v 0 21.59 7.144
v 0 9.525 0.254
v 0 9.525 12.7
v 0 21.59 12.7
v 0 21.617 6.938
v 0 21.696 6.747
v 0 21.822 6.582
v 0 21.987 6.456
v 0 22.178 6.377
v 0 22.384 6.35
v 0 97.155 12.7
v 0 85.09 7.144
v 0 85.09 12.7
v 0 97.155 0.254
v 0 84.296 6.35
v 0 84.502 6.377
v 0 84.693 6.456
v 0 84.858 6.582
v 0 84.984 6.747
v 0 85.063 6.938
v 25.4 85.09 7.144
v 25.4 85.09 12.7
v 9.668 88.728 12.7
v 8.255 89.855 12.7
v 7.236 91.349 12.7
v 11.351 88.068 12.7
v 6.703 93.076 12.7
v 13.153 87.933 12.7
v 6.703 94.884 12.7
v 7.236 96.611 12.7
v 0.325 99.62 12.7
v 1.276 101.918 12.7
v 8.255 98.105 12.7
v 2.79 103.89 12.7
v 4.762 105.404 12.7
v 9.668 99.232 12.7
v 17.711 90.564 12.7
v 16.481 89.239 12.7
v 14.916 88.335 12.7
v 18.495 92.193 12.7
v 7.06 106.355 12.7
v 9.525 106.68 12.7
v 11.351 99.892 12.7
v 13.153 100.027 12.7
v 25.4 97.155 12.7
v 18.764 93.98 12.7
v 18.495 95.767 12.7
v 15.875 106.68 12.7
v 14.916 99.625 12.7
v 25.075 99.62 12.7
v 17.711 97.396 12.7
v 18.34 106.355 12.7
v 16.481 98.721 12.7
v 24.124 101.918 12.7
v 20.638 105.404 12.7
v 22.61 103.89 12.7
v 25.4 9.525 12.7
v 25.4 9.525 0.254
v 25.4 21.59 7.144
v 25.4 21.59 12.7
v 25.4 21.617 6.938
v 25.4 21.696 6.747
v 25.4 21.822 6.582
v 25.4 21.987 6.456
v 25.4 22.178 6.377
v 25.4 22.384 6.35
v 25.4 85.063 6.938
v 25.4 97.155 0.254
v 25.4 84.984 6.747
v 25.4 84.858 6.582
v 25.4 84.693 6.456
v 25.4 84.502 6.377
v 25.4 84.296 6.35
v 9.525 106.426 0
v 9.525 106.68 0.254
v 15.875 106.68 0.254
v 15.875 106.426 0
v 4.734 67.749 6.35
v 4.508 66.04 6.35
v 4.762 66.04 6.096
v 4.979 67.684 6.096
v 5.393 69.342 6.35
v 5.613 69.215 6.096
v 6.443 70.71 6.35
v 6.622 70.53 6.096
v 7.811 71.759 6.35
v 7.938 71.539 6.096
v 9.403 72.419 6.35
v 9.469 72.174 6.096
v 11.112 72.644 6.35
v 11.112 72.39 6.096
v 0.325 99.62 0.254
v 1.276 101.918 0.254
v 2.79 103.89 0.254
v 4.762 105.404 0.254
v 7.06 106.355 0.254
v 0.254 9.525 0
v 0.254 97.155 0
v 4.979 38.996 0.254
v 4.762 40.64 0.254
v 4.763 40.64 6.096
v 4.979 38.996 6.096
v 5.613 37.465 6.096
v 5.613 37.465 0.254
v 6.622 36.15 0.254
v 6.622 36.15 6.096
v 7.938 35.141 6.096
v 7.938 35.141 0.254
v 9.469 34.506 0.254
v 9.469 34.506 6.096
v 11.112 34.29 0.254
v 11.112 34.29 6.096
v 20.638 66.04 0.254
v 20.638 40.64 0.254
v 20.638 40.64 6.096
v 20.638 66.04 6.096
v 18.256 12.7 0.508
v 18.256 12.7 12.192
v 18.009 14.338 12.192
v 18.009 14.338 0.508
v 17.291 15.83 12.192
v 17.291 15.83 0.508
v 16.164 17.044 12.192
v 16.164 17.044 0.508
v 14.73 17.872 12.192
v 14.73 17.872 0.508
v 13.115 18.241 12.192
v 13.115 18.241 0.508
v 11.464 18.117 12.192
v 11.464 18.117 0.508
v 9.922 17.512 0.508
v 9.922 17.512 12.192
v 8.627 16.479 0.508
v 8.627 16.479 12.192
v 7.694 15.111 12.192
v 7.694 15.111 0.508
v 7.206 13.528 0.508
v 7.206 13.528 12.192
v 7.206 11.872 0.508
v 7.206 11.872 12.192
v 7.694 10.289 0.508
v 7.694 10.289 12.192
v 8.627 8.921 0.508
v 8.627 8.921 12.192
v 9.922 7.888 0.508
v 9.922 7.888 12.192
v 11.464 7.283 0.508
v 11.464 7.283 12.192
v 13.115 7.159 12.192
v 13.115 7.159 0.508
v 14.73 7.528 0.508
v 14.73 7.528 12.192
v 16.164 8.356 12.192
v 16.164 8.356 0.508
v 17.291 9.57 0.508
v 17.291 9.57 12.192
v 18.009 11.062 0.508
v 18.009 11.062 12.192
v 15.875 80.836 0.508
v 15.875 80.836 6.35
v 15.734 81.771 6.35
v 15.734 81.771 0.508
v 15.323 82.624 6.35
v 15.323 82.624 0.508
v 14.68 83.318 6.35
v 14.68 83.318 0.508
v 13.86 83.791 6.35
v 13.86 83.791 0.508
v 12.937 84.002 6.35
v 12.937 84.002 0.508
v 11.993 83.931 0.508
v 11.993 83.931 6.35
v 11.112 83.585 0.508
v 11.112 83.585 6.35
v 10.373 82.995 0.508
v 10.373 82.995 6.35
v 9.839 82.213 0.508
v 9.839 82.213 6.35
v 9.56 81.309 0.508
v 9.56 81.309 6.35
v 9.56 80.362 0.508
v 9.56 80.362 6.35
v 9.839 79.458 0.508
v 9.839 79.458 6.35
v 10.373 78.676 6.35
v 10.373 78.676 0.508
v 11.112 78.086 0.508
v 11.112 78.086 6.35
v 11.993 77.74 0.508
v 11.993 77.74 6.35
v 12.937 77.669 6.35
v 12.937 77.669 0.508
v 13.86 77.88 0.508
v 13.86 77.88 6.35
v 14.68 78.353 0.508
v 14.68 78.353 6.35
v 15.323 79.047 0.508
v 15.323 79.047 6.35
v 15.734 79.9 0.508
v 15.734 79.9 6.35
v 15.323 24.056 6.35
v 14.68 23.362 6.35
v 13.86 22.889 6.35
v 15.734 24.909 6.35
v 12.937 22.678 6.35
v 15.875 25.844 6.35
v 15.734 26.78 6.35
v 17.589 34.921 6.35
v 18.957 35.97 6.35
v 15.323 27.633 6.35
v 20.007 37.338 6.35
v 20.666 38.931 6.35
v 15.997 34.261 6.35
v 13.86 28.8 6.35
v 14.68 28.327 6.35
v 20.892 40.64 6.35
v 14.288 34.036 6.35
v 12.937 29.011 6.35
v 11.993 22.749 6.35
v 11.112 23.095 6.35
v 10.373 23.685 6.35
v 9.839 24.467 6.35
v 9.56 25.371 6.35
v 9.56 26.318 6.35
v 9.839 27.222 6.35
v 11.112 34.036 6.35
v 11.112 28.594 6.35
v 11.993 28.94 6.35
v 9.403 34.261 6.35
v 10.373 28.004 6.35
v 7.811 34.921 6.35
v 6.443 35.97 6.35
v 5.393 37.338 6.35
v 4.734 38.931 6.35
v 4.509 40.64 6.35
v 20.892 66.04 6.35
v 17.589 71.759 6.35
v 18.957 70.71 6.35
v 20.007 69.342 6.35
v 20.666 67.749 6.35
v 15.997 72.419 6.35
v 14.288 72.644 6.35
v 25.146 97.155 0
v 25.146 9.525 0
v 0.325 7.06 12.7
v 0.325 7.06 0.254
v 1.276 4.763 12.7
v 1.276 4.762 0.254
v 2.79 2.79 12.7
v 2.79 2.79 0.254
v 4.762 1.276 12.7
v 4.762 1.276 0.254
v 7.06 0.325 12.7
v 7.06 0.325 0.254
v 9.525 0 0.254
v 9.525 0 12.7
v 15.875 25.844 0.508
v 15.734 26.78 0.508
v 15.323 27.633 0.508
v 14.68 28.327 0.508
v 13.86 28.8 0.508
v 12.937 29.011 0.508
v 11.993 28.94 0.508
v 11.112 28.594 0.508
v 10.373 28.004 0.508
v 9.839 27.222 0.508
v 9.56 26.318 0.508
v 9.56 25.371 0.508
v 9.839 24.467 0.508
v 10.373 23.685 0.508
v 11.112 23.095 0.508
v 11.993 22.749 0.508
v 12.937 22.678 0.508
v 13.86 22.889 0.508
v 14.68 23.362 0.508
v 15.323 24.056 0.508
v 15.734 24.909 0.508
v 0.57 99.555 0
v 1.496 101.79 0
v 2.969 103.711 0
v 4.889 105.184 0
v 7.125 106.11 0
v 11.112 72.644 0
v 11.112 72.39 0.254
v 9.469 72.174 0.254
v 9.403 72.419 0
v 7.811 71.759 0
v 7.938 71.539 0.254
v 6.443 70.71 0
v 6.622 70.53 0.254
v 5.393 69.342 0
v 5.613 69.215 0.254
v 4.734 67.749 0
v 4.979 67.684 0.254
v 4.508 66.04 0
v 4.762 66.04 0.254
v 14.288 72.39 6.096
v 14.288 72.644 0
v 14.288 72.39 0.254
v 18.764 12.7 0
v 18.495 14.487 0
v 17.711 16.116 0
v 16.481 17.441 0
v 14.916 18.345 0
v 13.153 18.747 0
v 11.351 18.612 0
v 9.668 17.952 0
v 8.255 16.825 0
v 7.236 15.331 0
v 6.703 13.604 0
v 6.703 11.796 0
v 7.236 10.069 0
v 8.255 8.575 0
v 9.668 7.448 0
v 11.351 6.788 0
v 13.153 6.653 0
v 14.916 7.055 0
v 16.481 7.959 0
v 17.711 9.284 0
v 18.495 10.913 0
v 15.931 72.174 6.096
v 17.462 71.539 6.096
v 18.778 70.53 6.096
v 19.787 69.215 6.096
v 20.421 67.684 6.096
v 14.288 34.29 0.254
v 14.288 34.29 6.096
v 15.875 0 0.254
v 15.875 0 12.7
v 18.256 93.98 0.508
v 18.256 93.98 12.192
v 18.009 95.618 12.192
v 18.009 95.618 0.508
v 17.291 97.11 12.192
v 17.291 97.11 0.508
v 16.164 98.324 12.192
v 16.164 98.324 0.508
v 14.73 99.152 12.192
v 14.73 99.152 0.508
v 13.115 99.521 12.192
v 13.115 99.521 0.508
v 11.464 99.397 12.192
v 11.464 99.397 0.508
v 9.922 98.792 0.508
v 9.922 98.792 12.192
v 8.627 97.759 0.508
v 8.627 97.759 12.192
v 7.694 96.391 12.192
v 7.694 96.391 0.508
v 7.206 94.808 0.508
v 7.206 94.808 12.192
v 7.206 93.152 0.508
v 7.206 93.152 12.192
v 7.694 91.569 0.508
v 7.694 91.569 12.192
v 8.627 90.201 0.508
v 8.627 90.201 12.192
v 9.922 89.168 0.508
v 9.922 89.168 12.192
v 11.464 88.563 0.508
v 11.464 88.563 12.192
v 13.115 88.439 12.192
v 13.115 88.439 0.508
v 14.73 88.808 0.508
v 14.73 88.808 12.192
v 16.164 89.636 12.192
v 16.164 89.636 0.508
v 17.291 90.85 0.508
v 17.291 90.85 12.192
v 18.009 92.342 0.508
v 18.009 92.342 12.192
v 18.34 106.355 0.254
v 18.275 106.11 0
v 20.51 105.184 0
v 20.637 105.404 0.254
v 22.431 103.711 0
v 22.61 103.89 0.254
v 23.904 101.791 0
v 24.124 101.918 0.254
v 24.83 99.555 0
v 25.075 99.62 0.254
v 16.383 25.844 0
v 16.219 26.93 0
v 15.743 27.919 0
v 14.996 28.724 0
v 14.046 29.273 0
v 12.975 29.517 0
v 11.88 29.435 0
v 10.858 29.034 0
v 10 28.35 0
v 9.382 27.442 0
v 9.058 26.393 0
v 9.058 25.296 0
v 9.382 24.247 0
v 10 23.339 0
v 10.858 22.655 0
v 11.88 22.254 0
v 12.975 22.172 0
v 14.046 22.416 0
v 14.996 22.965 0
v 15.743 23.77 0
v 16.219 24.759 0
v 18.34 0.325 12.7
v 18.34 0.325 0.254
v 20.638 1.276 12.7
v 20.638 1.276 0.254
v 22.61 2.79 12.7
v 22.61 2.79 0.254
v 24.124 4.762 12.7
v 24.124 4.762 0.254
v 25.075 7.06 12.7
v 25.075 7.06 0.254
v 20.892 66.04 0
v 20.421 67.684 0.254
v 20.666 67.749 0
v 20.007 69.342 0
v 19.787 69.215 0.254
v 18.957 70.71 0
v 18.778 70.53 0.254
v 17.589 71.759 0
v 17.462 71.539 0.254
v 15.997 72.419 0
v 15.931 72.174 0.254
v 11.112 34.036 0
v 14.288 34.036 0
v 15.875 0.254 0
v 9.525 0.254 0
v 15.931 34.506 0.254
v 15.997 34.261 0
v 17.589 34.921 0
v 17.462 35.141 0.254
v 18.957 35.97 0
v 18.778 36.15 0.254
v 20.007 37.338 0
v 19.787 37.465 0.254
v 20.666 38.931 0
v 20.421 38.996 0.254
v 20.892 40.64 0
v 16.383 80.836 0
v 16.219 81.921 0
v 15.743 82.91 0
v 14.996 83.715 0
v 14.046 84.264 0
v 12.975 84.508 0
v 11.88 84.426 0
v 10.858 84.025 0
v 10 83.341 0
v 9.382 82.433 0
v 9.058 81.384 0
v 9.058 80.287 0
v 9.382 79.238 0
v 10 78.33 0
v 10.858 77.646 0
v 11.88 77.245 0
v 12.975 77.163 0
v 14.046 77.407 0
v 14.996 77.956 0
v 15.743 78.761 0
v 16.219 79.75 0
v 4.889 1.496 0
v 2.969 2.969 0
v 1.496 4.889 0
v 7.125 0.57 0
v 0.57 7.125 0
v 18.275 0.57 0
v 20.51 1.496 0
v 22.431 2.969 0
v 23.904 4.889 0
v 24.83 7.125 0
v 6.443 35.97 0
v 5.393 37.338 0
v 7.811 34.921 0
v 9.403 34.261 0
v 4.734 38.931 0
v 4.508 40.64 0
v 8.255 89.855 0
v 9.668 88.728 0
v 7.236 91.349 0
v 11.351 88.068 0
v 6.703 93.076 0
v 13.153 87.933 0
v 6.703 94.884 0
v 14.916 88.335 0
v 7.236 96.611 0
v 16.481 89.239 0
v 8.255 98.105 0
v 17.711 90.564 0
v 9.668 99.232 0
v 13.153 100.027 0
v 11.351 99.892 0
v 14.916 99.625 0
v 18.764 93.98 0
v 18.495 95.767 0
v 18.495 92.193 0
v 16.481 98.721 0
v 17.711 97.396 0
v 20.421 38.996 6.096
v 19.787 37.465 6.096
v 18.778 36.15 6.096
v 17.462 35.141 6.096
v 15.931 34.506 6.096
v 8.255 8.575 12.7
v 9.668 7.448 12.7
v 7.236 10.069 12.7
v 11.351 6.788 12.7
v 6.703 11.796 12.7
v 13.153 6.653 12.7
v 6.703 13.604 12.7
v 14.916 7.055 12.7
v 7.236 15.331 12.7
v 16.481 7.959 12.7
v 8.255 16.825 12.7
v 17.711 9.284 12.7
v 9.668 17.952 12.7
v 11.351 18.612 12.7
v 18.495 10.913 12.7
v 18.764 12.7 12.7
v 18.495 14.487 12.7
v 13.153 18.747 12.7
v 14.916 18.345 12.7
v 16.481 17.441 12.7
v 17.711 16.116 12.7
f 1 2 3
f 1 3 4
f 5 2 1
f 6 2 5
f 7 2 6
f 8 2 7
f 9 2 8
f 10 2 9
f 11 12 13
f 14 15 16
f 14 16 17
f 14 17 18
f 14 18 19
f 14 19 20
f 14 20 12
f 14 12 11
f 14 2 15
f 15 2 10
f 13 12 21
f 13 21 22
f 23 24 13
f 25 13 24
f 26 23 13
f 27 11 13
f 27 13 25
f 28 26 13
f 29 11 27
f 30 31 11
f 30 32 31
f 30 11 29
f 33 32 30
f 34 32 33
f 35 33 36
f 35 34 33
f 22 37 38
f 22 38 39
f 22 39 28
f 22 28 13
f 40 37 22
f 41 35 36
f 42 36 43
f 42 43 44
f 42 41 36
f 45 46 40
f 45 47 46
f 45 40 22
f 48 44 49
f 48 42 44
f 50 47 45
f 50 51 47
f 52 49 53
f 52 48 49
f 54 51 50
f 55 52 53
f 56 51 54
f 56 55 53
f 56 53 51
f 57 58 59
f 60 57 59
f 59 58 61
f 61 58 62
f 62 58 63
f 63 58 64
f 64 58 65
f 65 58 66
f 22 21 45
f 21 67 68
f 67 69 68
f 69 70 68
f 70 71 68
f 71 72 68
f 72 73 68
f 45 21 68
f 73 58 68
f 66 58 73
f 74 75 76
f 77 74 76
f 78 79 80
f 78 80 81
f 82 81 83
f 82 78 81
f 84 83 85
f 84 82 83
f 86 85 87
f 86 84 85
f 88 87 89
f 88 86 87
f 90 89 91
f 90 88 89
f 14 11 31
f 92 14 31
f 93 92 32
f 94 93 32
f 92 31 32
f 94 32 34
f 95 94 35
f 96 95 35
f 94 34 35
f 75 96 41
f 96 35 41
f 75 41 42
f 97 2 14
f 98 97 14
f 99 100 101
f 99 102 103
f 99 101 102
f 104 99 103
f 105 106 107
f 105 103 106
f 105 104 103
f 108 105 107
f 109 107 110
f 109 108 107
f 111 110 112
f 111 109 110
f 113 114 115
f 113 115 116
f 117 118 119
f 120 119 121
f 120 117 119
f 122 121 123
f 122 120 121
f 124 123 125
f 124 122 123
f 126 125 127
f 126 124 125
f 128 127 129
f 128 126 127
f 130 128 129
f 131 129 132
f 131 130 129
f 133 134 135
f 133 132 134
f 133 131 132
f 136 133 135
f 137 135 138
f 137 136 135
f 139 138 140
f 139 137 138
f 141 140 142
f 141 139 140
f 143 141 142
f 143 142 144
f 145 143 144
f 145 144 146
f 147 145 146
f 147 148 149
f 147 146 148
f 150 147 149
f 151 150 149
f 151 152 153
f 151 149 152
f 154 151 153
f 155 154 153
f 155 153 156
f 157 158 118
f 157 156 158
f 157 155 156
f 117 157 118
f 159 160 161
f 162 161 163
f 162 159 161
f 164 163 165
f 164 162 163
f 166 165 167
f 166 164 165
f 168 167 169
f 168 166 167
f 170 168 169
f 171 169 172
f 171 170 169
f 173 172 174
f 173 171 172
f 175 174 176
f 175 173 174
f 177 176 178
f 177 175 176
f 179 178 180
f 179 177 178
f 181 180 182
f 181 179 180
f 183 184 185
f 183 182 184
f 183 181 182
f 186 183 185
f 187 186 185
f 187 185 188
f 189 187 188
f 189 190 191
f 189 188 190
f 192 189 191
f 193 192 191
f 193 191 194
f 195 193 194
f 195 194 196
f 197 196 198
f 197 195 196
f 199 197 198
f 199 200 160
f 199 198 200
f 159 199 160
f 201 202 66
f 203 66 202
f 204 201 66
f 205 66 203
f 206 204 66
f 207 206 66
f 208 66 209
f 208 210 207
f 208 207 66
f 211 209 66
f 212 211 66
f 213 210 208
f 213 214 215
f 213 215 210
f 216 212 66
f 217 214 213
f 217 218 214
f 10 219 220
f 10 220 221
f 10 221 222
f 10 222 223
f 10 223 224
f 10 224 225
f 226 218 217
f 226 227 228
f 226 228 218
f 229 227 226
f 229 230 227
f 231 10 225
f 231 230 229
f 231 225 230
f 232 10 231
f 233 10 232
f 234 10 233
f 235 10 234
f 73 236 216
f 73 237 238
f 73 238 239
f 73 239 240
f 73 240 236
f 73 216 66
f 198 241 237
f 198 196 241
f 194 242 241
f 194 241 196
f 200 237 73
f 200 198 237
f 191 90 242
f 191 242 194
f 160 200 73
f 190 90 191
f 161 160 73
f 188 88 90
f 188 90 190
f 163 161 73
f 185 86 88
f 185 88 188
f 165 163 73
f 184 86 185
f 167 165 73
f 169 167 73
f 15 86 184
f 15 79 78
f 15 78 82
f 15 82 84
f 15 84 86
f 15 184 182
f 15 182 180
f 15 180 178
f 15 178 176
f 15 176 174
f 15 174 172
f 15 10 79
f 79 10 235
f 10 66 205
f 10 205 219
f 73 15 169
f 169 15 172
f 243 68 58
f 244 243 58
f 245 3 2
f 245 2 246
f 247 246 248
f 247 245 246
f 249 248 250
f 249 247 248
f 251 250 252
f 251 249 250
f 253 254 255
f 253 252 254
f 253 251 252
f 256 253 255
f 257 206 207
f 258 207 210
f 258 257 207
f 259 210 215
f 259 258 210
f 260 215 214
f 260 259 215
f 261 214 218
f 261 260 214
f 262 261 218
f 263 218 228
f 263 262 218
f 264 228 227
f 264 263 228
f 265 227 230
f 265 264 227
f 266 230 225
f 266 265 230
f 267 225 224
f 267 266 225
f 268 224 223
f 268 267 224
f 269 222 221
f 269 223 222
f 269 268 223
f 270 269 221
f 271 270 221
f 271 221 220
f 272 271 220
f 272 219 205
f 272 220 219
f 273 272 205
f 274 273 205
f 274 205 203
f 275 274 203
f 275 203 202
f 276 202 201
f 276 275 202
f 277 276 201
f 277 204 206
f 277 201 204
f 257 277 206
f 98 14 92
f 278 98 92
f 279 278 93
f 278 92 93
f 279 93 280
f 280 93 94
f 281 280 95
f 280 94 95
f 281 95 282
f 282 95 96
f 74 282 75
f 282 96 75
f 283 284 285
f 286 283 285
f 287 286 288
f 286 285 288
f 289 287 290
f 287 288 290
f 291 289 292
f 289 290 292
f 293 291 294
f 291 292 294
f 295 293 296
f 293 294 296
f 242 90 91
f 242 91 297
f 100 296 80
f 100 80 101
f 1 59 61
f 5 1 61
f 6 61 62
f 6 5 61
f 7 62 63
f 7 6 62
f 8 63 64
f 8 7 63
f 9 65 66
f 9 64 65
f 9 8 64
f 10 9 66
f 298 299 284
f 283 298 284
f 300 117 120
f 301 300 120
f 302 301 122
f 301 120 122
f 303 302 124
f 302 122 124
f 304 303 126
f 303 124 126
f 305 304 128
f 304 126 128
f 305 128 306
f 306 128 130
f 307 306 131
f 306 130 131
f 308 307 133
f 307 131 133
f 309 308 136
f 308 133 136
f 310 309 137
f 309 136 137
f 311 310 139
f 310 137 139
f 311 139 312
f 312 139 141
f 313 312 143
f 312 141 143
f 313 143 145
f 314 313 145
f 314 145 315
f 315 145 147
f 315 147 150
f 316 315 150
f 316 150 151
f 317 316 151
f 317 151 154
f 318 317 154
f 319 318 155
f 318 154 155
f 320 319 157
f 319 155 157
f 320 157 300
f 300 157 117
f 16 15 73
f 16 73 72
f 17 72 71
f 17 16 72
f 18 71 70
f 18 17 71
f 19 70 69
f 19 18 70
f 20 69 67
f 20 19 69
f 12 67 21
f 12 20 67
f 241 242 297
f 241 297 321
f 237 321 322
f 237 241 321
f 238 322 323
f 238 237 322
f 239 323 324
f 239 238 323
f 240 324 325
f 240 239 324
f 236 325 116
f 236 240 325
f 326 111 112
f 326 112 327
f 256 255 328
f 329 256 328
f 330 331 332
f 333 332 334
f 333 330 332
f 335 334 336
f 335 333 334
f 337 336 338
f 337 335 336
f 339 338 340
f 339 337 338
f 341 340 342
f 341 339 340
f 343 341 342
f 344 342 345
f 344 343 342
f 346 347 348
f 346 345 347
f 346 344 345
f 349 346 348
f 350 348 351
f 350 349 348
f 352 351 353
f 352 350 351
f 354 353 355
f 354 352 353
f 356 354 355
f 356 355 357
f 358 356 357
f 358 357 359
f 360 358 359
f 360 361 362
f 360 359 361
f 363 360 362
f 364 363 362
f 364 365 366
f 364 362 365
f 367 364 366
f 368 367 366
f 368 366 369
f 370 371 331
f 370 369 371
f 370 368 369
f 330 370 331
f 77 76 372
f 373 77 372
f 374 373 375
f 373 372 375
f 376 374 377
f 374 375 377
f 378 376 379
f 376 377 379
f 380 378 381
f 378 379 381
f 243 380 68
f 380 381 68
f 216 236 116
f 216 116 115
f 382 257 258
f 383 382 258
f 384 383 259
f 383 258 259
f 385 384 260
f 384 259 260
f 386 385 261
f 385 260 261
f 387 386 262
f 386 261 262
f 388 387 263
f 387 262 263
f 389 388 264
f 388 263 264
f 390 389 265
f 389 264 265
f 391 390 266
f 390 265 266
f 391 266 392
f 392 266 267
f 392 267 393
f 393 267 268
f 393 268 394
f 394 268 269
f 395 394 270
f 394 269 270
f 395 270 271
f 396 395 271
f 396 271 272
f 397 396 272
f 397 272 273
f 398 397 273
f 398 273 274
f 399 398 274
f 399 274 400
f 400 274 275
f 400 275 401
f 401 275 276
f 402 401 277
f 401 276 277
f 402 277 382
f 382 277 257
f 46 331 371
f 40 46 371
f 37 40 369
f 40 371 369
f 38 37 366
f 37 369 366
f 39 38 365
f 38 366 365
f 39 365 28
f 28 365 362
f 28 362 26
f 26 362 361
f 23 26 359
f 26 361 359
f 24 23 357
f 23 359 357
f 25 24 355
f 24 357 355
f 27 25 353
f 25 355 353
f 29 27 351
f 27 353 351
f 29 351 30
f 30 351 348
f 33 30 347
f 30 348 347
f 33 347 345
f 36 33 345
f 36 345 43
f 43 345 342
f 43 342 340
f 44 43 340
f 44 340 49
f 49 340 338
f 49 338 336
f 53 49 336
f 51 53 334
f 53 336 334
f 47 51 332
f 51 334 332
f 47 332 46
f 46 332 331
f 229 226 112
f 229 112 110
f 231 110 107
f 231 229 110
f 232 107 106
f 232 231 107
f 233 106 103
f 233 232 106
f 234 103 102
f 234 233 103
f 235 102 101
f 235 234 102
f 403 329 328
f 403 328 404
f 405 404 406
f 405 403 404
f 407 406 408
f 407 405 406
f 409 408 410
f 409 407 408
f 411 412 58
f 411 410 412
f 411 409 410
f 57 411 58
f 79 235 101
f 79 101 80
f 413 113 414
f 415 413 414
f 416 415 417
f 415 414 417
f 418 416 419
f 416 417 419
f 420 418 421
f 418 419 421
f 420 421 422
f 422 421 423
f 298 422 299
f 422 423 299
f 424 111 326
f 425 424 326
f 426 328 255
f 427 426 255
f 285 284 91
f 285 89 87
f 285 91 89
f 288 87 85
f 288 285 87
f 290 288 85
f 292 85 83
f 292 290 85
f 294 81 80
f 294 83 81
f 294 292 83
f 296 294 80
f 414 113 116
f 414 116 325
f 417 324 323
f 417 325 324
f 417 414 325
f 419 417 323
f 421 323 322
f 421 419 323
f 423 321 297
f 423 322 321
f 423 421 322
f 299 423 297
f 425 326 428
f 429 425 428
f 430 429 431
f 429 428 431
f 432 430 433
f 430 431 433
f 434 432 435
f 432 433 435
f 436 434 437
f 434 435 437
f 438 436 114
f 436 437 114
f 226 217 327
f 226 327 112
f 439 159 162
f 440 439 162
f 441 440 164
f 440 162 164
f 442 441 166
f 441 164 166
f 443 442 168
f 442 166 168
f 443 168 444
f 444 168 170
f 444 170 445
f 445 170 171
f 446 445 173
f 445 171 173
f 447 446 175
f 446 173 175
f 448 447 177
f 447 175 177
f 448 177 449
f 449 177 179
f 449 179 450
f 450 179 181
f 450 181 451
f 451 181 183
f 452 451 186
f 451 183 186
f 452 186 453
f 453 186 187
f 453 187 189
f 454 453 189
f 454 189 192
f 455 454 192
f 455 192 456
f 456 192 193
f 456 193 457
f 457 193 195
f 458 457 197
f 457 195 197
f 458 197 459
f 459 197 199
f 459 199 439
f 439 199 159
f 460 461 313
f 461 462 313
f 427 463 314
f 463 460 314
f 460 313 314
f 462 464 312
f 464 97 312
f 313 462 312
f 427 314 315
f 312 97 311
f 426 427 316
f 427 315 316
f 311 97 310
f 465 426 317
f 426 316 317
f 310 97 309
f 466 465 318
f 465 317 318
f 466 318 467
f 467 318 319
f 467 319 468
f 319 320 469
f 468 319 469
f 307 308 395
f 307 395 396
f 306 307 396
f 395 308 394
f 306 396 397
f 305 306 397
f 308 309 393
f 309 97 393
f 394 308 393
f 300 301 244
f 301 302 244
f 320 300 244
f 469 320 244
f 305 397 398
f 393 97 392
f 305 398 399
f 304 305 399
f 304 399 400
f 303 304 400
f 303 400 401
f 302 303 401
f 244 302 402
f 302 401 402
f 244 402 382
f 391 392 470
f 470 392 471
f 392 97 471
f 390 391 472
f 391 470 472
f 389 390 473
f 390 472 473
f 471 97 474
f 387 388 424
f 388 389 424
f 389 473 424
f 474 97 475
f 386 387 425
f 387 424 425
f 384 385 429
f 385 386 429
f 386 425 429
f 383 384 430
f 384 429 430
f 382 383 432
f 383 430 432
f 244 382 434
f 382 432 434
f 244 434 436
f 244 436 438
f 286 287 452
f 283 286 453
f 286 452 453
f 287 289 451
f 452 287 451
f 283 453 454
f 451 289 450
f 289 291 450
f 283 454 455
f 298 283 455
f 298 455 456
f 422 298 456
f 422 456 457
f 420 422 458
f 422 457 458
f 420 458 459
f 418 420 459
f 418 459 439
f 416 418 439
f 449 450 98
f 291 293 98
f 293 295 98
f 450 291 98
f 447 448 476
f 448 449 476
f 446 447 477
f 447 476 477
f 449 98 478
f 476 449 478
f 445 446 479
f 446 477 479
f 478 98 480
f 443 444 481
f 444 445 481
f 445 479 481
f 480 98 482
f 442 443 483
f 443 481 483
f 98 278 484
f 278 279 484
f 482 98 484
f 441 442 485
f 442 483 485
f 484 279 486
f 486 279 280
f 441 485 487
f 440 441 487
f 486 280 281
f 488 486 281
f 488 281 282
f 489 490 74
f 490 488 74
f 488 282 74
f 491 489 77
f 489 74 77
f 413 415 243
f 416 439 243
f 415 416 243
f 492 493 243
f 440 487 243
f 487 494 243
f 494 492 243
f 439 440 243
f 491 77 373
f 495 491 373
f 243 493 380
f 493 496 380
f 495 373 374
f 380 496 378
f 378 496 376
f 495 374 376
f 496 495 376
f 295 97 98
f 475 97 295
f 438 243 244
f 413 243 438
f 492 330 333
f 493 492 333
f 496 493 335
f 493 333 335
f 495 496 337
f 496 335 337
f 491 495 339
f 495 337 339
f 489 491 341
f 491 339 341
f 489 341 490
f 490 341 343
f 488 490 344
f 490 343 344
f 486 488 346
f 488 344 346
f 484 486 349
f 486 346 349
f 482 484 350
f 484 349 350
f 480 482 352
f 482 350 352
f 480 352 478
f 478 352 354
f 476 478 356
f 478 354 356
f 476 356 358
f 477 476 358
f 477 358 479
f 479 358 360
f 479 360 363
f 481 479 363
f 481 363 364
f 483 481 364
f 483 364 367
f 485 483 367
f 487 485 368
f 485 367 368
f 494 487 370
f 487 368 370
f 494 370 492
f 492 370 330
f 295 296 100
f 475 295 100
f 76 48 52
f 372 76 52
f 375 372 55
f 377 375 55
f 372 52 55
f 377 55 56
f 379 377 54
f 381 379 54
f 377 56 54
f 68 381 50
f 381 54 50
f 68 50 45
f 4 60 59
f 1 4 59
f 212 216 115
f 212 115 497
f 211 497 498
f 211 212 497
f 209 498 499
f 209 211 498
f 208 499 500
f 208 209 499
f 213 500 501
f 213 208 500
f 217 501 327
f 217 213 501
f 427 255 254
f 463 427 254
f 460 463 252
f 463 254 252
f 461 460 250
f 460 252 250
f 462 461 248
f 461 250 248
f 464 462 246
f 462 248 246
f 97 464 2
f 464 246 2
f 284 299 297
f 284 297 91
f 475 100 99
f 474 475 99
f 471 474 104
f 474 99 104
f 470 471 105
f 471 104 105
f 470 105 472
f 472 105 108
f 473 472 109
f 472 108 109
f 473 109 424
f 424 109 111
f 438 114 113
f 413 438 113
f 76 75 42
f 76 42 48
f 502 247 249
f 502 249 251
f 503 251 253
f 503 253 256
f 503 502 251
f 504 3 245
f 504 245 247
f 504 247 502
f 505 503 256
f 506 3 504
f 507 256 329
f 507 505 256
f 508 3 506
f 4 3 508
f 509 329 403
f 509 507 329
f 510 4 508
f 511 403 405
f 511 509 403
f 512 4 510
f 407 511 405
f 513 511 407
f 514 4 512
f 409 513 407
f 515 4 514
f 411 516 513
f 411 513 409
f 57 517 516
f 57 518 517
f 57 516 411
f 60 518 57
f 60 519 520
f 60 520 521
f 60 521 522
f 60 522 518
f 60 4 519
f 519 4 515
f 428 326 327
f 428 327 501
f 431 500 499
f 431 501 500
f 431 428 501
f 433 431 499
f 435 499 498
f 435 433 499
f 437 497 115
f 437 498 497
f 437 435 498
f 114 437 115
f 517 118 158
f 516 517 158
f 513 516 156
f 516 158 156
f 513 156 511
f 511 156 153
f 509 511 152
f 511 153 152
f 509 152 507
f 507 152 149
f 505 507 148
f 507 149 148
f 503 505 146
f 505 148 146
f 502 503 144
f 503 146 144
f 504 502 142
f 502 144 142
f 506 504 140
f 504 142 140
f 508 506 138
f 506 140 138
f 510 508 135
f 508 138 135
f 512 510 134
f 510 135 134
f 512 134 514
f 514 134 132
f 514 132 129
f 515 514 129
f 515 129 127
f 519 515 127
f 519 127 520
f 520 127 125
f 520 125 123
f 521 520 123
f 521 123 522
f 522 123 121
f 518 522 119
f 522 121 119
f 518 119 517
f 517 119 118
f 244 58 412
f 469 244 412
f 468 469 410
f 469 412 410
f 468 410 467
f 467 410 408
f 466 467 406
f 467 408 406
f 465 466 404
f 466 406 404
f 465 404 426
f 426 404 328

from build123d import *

# Parameters (mm, degrees)
F0_W     = 25.4
F0_H     = 106.68
F1_DEPTH = 12.7
F3_DEPTH = 27.94
F4_R     = 3.175
F5_DEPTH = 25.4
F6_R     = 5.55625
F7_DEPTH = 25.4
F9_DEPTH = 25.4
F10_SIZE = 0.508
F11_SIZE = 0.254
F12_R    = 9.525
F13_SIZE = 0.254


with BuildPart() as f1:
    # F0 (on Top) → F1 (new body)
    with BuildSketch(Plane.XY):
        with Locations((12.7, 53.34)):
            Rectangle(F0_W, F0_H)
    extrude(amount=F1_DEPTH)

    # F2 (on Right) → F3 (cut)
    with BuildSketch(Plane.YZ):
        with BuildLine():
            ThreePointArc((21.59, 7.14375), (21.8224839924, 6.5824839924), (22.38375, 6.35))
            Line((22.38375, 6.35), (84.29625, 6.35))
            ThreePointArc((84.29625, 6.35), (84.8575160076, 6.5824839924), (85.09, 7.14375))
            Line((85.09, 7.14375), (85.09, 19.05))
            Line((85.09, 19.05), (21.59, 19.05))
            Line((21.59, 19.05), (21.59, 7.14375))
        make_face()
    extrude(amount=F3_DEPTH, mode=Mode.SUBTRACT)

    # F4 (on Top) → F5 (cut)
    with BuildSketch(Plane.XY):
        with Locations((12.7, 80.8355)):
            Circle(F4_R)
        with Locations((12.7, 25.8445)):
            Circle(F4_R)
    extrude(amount=F5_DEPTH, mode=Mode.SUBTRACT)

    # F6 (on Top) → F7 (cut)
    with BuildSketch(Plane.XY):
        with Locations((12.7, 93.98)):
            Circle(F6_R)
        with Locations((12.7, 12.7)):
            Circle(F6_R)
    extrude(amount=F7_DEPTH, mode=Mode.SUBTRACT)

    # F8 (on Top) → F9 (cut)
    with BuildSketch(Plane.XY):
        with BuildLine():
            Line((14.2875, 72.39), (11.1125, 72.39))
            ThreePointArc((11.1125, 72.39), (6.6223719395, 70.5301280605), (4.7625, 66.04))
            Line((4.7625, 66.04), (4.7625, 40.64))
            ThreePointArc((4.7625, 40.64), (6.6223719395, 36.1498719395), (11.1125, 34.29))
            Line((11.1125, 34.29), (14.2875, 34.29))
            ThreePointArc((14.2875, 34.29), (18.7776280605, 36.1498719395), (20.6375, 40.64))
            Line((20.6375, 40.64), (20.6375, 66.04))
            ThreePointArc((20.6375, 66.04), (18.7776280605, 70.5301280605), (14.2875, 72.39))
        make_face()
    extrude(amount=F9_DEPTH, mode=Mode.SUBTRACT)

    # F10
    f10_edges = [f1.edges().sort_by_distance(p)[0] for p in [
        (7.14375, 12.7, 0),
        (7.14375, 93.98, 0),
        (9.525, 80.8355, 0),
        (9.525, 25.8445, 0),
        (7.14375, 93.98, 12.7),
        (7.14375, 12.7, 12.7),
    ]]
    chamfer(f10_edges, length=F10_SIZE)

    # F11
    f11_edges = [f1.edges().sort_by_distance(p)[0] for p in [
        (4.7625, 53.34, 0),
        (20.6375, 53.34, 6.35),
    ]]
    chamfer(f11_edges, length=F11_SIZE)

    # F12
    f12_edges = [f1.edges().sort_by_distance(p)[0] for p in [
        (25.4, 0, 6.35),
        (0, 0, 6.35),
        (25.4, 106.68, 6.35),
        (0, 106.68, 6.35),
    ]]
    fillet(f12_edges, radius=F12_R)

    # F13
    f13_edges = [f1.edges().sort_by_distance(p)[0] for p in [
        (0, 53.34, 0),
    ]]
    chamfer(f13_edges, length=F13_SIZE)


solid = f1.part
